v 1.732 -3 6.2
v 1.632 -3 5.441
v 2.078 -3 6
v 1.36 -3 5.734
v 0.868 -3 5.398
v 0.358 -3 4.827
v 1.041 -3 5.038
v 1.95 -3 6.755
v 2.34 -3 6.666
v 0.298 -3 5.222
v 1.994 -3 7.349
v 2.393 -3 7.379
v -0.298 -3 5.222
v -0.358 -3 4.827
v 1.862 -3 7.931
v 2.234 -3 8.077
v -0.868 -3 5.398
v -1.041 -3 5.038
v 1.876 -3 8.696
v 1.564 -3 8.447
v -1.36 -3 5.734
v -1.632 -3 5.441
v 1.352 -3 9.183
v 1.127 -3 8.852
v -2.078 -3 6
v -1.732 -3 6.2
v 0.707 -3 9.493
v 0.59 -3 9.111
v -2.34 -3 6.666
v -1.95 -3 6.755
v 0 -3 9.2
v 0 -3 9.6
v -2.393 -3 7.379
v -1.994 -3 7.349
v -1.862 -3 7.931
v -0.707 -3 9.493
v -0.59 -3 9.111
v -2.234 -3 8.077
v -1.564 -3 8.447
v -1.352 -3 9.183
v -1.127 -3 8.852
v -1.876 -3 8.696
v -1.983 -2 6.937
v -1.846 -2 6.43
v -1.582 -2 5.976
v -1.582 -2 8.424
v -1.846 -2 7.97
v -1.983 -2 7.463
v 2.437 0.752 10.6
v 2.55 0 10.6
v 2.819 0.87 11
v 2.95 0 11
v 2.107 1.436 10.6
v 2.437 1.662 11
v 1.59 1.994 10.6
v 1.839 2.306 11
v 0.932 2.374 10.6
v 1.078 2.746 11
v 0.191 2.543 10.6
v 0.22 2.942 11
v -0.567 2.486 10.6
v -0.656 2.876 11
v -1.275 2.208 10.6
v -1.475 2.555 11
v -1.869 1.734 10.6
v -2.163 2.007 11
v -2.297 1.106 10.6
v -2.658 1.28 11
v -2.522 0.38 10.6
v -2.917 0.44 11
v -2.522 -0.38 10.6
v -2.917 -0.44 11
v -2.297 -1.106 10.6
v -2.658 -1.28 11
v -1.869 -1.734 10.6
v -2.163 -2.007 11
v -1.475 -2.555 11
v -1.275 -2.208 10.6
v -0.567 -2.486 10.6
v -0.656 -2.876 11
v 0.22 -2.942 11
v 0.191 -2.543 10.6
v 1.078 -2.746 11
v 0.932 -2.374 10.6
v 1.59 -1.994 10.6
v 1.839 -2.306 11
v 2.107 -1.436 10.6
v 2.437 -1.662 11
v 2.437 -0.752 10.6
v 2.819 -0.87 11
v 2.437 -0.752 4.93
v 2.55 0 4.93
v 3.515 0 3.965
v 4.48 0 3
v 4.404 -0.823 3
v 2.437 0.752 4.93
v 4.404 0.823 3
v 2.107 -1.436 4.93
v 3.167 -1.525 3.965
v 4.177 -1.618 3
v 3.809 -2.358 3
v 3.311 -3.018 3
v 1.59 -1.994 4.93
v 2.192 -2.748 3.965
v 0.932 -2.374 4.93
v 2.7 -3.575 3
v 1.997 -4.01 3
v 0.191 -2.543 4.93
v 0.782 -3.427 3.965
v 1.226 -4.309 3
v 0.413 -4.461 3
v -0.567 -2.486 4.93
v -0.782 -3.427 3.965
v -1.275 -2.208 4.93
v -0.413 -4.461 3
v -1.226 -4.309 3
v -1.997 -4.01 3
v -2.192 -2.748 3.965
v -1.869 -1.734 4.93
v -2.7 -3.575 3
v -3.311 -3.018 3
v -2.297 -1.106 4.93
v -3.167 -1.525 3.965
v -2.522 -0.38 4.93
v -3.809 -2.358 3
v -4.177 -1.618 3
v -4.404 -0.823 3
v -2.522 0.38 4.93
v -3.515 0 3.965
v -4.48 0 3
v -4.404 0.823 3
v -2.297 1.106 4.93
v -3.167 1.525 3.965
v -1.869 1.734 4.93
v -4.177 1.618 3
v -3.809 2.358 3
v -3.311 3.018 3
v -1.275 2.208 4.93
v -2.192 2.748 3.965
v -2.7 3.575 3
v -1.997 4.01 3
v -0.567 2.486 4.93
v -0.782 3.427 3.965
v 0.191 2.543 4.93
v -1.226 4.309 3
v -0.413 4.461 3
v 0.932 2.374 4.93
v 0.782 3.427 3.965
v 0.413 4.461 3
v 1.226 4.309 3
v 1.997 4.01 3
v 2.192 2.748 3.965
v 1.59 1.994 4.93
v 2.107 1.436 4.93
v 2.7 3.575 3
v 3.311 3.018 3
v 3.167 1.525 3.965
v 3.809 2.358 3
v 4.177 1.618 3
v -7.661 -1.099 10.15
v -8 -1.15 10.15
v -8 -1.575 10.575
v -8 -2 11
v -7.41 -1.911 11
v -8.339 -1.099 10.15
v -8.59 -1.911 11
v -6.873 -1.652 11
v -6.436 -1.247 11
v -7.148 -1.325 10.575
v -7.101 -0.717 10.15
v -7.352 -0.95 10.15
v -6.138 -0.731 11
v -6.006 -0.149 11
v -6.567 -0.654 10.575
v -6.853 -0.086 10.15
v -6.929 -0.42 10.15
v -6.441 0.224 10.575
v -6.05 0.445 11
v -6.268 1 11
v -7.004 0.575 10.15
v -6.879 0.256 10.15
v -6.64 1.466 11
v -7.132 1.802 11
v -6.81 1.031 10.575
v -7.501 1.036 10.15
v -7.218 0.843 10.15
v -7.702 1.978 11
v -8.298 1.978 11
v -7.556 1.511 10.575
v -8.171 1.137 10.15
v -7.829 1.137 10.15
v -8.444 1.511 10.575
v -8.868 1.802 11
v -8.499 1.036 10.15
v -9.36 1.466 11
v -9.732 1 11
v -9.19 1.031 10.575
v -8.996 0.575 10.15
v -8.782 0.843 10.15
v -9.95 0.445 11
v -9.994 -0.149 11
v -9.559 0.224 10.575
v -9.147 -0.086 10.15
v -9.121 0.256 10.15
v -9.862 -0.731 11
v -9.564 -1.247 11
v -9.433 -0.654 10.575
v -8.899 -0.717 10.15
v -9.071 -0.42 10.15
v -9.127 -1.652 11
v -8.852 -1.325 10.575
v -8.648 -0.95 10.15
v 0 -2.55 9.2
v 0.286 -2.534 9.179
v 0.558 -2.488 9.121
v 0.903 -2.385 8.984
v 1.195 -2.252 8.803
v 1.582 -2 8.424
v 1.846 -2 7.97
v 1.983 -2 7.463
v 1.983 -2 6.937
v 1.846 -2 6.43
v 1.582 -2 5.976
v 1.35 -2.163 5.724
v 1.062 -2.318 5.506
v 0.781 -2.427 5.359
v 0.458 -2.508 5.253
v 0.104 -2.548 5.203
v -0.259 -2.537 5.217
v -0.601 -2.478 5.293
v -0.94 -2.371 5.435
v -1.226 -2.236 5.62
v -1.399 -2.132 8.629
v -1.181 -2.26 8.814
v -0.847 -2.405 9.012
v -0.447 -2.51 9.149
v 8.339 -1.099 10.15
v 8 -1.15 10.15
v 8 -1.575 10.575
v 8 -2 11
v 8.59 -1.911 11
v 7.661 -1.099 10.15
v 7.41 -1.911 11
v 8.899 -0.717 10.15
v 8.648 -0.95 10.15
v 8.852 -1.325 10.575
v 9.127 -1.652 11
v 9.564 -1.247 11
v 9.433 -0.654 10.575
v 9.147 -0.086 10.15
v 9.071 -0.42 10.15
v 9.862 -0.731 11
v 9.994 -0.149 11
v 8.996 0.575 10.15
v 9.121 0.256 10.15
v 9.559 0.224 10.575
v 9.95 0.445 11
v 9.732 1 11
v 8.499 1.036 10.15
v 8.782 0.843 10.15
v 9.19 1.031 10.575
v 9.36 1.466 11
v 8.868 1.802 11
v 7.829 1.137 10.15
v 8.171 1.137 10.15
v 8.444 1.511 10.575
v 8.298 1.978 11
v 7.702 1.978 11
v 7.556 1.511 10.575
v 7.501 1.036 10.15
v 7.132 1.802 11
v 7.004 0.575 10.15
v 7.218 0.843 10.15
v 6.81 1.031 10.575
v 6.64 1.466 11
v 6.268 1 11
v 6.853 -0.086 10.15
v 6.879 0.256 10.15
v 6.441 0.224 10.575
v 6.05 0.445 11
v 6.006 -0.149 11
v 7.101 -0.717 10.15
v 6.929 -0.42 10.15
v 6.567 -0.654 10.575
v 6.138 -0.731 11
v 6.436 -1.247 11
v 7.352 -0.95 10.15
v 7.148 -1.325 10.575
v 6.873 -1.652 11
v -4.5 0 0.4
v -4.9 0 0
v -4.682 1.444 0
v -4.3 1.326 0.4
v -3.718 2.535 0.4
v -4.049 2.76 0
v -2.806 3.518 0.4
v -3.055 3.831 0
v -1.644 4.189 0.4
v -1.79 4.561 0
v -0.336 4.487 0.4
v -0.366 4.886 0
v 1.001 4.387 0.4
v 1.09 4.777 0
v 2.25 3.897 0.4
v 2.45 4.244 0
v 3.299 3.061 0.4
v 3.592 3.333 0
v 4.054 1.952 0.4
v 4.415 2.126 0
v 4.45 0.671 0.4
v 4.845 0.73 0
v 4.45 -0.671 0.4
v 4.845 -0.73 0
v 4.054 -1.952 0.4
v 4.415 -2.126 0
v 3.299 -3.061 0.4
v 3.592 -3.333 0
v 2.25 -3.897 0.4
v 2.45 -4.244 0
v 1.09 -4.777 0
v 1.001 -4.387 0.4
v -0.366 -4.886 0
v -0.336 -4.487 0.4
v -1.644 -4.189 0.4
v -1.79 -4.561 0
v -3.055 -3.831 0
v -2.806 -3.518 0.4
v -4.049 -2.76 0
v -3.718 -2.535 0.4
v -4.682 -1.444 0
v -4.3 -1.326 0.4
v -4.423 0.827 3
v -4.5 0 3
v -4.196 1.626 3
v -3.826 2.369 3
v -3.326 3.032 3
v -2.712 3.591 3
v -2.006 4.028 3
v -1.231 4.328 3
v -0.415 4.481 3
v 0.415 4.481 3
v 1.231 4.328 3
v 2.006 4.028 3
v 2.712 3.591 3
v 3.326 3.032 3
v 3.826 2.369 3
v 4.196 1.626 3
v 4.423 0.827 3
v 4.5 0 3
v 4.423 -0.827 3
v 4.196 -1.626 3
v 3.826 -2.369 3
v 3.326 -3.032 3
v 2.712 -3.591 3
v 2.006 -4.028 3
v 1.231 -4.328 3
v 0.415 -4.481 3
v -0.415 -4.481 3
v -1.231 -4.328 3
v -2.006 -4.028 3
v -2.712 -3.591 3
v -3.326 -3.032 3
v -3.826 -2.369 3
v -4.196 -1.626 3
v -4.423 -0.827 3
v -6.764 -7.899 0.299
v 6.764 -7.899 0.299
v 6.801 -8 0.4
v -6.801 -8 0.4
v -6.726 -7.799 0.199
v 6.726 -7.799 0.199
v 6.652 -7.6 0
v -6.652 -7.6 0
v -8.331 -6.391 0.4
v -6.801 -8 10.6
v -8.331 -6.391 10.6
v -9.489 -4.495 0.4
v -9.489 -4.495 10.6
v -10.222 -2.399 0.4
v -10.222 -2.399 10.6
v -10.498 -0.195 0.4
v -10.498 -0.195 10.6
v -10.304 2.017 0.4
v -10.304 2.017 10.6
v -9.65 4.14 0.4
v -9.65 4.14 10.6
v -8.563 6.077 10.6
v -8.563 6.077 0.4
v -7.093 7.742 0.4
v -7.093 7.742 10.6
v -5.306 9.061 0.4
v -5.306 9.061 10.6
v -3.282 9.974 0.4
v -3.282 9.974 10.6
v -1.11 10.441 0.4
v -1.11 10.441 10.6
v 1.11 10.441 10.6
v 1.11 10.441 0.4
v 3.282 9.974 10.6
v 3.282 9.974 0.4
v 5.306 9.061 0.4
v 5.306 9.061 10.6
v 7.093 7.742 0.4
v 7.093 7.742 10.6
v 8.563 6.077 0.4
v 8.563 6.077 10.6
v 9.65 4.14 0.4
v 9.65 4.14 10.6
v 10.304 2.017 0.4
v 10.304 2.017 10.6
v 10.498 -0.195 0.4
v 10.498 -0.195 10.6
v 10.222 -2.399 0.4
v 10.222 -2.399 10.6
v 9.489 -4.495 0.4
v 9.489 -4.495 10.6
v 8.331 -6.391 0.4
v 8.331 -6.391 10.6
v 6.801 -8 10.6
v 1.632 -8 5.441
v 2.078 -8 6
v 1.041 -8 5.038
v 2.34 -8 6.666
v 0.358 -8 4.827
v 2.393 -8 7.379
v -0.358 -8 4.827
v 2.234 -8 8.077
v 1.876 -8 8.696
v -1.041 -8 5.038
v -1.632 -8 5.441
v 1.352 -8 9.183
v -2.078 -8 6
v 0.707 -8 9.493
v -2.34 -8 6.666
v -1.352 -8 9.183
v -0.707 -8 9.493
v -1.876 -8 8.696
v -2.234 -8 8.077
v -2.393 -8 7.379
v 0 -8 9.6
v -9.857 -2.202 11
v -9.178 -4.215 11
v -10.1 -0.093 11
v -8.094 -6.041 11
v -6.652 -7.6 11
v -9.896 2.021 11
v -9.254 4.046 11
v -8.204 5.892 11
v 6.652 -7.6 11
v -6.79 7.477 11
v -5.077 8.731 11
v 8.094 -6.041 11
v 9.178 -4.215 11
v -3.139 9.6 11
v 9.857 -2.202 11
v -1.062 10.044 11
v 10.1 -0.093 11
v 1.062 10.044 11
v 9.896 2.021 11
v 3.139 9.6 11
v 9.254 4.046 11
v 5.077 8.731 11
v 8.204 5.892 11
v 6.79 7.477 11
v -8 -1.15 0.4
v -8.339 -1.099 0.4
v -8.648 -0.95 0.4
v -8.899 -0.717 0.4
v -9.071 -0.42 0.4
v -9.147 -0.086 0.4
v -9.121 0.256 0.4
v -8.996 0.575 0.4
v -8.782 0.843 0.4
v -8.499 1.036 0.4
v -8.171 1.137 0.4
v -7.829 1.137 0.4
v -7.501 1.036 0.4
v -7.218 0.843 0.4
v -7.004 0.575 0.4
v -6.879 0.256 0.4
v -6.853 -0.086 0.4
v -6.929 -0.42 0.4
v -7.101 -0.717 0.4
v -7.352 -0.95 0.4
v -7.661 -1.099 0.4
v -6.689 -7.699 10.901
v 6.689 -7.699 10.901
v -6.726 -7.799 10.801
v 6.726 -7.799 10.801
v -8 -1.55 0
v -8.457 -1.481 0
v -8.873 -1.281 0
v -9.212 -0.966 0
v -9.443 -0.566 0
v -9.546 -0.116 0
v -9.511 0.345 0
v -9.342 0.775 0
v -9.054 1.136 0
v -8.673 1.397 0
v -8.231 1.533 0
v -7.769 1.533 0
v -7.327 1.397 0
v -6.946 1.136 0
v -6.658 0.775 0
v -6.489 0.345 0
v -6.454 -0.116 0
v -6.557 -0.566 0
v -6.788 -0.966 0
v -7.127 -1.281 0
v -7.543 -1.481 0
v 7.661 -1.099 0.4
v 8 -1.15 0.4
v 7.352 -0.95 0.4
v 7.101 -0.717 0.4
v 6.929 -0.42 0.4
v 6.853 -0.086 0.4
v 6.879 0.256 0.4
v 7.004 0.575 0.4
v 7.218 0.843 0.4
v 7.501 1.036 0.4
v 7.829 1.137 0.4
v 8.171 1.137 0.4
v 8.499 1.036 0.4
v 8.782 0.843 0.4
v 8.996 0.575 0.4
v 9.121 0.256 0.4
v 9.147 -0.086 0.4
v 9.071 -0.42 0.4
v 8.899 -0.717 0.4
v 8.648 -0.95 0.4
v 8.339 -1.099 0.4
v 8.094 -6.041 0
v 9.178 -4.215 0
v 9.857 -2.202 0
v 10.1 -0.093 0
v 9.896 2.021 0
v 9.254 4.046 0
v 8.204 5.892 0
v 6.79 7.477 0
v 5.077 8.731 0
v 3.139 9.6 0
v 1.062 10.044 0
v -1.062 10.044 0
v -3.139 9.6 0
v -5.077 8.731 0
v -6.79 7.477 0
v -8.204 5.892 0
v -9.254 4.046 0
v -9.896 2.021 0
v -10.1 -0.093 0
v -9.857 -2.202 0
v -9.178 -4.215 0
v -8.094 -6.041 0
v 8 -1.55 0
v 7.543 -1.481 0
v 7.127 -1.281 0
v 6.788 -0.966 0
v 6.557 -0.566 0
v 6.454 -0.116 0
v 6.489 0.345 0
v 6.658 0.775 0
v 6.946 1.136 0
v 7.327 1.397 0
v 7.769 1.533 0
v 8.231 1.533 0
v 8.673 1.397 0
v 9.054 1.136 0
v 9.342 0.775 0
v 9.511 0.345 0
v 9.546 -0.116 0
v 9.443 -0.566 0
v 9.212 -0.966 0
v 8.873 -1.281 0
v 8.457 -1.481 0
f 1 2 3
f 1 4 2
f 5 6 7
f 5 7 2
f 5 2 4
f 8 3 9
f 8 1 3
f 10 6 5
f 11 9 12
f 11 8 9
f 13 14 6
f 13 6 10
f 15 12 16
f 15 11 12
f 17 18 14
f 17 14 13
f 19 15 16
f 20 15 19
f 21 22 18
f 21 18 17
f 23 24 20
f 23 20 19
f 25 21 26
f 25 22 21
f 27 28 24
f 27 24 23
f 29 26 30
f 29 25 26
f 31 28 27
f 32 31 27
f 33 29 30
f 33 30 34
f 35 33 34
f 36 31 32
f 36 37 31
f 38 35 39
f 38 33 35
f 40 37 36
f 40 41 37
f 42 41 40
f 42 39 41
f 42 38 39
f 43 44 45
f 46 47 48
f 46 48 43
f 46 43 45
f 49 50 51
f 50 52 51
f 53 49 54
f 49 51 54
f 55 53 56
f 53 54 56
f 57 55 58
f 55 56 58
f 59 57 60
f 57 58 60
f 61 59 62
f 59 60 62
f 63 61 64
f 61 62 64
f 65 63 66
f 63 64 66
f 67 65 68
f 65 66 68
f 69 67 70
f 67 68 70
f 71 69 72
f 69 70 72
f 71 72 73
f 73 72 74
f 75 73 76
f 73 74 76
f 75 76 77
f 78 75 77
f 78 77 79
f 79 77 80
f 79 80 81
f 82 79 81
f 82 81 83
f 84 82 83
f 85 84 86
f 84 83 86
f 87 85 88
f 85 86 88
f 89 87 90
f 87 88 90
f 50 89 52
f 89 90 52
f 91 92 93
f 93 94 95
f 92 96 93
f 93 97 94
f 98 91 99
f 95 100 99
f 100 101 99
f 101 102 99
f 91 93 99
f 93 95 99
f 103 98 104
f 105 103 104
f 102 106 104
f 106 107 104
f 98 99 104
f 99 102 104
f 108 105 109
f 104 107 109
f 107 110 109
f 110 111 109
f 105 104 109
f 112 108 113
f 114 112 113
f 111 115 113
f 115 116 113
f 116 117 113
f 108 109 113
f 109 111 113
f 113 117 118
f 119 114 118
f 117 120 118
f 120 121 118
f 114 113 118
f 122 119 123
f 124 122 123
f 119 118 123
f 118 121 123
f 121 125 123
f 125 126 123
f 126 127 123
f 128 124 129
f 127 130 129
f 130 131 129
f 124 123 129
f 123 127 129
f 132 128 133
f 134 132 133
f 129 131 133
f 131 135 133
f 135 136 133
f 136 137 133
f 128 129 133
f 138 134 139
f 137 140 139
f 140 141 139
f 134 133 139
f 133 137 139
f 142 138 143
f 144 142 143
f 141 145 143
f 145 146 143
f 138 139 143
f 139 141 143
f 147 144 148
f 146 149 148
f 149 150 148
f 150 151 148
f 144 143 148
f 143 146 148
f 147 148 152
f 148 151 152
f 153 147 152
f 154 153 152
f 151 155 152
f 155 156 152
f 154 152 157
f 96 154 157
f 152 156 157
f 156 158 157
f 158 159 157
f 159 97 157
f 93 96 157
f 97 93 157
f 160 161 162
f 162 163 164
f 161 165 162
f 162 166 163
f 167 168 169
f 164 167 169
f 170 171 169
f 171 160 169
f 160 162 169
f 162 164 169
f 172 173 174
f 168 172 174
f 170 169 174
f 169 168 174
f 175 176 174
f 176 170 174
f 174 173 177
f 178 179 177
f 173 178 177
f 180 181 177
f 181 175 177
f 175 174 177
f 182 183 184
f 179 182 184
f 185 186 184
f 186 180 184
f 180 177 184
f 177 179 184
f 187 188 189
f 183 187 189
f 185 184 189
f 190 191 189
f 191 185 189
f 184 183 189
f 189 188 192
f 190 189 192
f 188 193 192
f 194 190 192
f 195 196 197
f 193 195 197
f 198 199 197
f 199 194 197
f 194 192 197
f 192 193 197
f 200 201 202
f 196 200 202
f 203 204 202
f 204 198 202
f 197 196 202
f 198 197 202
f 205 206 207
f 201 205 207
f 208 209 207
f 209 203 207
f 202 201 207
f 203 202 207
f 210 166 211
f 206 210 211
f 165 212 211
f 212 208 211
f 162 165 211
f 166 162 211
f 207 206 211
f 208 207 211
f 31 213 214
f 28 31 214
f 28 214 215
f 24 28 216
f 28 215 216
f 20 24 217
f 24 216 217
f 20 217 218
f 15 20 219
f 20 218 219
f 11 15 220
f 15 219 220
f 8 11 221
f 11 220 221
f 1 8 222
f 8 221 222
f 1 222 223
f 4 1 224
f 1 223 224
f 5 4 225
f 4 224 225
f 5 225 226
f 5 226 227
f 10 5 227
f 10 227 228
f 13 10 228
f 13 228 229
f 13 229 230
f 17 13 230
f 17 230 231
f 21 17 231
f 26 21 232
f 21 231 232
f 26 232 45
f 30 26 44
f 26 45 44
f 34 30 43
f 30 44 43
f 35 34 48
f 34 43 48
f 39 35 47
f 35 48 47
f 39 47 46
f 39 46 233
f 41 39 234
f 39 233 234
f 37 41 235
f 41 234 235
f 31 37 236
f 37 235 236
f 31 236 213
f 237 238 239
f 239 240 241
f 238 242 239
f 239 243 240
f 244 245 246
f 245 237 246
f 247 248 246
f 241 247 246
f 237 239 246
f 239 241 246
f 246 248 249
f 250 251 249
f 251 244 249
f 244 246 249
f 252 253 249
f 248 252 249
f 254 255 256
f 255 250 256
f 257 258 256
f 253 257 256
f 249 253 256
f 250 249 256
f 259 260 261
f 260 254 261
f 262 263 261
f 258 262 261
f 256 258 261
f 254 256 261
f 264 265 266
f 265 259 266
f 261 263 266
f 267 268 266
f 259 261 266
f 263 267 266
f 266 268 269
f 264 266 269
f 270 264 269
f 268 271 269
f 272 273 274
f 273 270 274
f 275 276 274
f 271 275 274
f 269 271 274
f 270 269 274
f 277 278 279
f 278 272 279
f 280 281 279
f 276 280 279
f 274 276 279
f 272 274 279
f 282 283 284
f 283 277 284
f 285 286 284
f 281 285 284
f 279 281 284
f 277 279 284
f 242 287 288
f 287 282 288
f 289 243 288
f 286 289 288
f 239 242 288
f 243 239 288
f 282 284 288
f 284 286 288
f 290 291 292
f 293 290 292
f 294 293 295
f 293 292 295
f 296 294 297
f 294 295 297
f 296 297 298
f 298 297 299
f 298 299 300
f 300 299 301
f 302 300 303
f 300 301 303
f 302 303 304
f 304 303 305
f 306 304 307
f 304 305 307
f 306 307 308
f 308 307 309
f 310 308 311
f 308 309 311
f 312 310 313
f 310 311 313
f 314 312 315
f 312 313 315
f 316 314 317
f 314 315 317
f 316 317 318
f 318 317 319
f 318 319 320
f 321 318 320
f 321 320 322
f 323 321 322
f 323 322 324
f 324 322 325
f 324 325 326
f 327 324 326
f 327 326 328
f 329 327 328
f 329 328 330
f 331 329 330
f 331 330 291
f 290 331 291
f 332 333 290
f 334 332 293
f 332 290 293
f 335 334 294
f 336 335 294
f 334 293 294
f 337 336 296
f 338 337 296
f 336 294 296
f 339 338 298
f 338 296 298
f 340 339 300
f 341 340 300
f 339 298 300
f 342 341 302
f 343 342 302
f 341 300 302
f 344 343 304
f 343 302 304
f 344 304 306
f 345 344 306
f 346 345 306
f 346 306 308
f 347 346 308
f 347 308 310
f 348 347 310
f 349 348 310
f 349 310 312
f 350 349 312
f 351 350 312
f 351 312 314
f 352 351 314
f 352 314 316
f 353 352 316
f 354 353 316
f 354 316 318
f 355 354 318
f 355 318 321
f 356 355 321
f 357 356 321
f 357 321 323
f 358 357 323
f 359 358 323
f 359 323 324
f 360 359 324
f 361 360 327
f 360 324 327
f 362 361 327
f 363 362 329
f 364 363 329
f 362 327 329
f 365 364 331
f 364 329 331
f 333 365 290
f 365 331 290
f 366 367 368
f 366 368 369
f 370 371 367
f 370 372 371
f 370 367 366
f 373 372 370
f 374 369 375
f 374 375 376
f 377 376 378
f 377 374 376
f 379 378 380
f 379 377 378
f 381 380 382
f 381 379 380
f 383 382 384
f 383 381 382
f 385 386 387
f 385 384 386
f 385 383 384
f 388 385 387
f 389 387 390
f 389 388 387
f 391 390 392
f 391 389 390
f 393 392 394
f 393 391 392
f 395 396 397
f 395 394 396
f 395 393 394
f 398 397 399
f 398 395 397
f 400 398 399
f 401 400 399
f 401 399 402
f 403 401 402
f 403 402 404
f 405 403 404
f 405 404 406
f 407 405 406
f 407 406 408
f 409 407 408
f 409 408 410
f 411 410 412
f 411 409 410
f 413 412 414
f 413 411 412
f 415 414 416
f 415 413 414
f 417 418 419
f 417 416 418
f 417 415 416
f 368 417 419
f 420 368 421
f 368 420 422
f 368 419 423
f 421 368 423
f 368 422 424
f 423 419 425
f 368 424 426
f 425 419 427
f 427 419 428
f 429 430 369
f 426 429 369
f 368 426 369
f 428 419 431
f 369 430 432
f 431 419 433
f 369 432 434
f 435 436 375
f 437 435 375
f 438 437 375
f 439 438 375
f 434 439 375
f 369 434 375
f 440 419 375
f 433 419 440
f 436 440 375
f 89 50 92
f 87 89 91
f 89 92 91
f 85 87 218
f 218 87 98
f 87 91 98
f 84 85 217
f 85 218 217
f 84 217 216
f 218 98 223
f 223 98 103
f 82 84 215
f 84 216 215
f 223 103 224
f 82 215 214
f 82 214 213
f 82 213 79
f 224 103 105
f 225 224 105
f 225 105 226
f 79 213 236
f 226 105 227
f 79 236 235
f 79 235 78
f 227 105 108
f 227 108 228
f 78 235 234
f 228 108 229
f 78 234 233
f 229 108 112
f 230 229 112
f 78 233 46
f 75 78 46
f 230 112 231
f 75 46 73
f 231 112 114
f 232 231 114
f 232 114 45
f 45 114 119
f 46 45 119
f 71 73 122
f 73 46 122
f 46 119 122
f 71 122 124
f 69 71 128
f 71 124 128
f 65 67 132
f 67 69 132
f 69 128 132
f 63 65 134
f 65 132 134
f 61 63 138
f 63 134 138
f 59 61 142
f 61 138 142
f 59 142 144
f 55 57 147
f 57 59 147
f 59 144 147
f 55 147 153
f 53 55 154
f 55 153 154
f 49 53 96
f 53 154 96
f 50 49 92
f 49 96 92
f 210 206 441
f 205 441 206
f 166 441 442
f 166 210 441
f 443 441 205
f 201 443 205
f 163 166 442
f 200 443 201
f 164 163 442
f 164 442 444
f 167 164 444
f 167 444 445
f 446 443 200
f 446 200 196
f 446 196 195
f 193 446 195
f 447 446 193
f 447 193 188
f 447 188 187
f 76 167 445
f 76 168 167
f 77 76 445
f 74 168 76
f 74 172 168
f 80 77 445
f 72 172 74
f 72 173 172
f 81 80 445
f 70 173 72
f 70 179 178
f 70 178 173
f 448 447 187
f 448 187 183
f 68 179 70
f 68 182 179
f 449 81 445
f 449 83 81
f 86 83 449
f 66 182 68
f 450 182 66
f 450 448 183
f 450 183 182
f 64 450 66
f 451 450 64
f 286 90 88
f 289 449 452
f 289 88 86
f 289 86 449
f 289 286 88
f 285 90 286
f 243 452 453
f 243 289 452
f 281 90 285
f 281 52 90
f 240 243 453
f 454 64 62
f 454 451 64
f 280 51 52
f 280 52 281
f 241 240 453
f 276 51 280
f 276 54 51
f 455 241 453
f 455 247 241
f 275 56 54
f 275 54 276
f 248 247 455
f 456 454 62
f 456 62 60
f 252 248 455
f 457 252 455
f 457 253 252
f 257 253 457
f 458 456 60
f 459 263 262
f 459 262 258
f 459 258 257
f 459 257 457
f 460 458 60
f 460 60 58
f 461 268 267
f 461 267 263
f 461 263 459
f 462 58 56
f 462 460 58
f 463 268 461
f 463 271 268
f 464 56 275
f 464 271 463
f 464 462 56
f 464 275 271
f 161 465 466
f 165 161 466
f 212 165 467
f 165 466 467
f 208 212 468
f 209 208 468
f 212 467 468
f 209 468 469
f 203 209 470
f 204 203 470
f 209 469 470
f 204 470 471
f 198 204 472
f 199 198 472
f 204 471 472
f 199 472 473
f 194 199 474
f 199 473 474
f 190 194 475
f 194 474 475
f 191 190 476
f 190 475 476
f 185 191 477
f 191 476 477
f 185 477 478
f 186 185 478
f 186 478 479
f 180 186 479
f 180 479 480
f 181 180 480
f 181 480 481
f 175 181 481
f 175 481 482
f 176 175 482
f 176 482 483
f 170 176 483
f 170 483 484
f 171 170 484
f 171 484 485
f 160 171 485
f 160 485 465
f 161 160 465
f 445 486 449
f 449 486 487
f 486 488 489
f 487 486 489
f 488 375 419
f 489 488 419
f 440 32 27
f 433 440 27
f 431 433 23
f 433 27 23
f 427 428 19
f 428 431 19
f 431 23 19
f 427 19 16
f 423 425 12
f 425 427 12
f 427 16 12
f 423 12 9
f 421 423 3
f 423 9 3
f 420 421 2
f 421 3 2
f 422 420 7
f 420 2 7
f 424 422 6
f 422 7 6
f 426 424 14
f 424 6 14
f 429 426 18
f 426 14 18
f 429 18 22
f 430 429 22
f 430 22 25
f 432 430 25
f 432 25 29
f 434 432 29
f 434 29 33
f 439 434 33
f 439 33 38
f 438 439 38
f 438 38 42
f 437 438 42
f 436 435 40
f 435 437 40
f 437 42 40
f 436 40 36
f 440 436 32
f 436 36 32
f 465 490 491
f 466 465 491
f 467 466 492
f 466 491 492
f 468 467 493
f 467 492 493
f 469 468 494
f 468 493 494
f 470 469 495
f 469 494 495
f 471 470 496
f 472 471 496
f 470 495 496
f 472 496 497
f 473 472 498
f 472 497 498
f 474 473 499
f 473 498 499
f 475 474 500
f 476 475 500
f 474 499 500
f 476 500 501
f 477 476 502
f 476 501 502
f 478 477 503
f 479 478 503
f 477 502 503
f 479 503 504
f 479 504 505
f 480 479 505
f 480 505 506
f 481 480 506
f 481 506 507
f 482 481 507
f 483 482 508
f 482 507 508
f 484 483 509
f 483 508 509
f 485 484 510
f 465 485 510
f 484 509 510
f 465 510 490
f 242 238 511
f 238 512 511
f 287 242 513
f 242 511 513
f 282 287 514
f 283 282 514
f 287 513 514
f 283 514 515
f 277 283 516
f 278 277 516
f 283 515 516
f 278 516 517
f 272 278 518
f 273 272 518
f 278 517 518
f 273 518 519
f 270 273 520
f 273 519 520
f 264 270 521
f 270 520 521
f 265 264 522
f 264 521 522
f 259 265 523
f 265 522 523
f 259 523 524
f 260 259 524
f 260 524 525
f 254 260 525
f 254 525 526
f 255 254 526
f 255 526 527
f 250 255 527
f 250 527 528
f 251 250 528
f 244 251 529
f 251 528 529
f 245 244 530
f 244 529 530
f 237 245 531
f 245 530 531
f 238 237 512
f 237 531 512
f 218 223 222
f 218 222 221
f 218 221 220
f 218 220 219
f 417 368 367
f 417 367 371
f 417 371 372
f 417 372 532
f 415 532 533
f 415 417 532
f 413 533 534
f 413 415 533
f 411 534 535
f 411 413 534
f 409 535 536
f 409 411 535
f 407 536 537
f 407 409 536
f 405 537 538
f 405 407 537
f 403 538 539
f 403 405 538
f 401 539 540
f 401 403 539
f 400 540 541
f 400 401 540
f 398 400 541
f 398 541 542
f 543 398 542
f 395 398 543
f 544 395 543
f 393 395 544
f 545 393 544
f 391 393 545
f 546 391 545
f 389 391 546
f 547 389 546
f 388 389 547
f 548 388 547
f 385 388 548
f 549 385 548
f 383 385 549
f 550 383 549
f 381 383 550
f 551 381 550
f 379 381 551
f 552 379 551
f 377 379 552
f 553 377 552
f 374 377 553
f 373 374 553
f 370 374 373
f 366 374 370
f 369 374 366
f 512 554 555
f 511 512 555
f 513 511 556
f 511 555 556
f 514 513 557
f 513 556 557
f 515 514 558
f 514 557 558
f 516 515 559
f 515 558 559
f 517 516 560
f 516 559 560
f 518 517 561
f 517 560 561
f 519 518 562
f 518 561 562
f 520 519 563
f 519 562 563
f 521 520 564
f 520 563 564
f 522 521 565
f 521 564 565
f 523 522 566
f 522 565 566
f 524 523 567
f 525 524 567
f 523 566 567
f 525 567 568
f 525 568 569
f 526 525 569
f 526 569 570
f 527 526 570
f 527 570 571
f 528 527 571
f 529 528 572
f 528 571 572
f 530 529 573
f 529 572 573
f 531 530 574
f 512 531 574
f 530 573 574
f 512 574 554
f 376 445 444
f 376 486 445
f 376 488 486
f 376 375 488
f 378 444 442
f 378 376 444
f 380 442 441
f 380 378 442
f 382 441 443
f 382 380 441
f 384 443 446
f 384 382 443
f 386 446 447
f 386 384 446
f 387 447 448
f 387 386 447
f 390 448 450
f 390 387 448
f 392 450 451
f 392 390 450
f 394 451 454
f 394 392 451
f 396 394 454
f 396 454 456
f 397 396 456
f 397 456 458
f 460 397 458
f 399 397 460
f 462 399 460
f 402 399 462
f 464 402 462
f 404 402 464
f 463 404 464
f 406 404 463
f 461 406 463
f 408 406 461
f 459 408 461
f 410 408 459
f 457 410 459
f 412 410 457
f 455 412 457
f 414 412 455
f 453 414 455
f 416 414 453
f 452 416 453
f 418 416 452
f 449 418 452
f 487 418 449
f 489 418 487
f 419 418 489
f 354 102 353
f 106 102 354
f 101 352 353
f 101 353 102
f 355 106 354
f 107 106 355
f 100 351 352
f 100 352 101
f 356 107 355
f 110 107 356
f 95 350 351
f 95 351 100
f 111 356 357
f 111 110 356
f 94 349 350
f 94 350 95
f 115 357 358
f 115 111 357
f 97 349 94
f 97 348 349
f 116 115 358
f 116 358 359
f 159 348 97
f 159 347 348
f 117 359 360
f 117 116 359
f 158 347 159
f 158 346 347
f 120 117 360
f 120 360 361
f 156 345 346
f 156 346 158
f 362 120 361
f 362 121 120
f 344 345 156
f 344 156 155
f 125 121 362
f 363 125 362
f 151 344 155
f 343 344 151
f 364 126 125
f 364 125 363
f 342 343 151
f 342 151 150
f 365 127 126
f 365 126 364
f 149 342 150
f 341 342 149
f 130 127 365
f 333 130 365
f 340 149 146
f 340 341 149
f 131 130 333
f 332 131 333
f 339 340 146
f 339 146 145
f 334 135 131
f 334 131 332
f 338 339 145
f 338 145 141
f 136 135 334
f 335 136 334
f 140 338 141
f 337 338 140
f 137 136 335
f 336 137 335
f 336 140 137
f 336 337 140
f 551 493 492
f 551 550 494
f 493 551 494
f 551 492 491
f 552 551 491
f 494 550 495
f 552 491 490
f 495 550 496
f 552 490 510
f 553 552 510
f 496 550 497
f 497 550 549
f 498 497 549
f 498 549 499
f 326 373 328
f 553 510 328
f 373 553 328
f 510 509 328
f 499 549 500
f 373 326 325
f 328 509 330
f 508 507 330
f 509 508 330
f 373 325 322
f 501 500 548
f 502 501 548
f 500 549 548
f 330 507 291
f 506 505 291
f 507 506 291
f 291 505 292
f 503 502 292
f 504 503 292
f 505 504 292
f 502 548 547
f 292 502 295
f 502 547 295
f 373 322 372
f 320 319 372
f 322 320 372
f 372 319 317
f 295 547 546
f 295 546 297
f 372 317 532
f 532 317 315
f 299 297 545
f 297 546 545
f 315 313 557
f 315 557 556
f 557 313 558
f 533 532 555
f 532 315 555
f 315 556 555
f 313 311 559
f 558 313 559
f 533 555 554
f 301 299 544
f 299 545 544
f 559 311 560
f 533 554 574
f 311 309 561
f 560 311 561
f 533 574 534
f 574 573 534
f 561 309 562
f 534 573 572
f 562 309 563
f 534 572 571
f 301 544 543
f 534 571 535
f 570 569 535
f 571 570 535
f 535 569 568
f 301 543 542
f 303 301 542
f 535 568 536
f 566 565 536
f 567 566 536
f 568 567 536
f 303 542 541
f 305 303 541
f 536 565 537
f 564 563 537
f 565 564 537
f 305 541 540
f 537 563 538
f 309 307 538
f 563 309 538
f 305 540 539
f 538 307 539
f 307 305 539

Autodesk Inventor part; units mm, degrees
ref_plane "YZ Plane" through (0, 0, 0) normal (1, 0, 0) x (0, 1, 0)
ref_plane "XZ Plane" through (0, 0, 0) normal (0, 1, 0) x (-1, 0, 0)
ref_plane "XY Plane" through (0, 0, 0) normal (0, 0, 1) x (1, 0, 0)
sketch "Sketch1" plane through (0, 0, 0) normal (0, 0, 1) x (1, 0, 0)
  circle A0 centre (0, 0) radius 2.55
  circle A1 centre (0, 0) radius 10.5
  dimension "d0" = 21
  dimension "d1" = 5.1
extrude "Extrusion1" add sketch "Sketch1" along normal blind 11
sketch "Sketch3" plane through (0, 0, 0) normal (0, 0, -1) x (-1, 0, 0)
  circle A0 centre (0, 0) radius 4.5
  dimension "d12" = 9
extrude "Extrusion2" cut sketch "Sketch3" against normal blind 3
chamfer "Chamfer1" distance 1.93 angle 45 1 edges at (-2.55, 0, 3)
sketch "Sketch4" plane through (0, 0, 11) normal (0, 0, 1) x (1, 0, 0)
  line L0 (10, -8) -> (-10, -8)
  line L1 (-10, -8) -> (-10, -18)
  line L2 (-10, -18) -> (10, -18)
  line L3 (10, -18) -> (10, -8)
  point P0 (0, 0)
  point P1 (0, -8)
  dimension "d18" = 20
  dimension "d19" = 8
  dimension "d20" = 10
extrude "Extrusion3" cut sketch "Sketch4" against normal through all
sketch "Sketch2" plane through (0, 0, 11) normal (0, 0, 1) x (1, 0, 0)
  circle A0 centre (0, 0) radius 8 construction
  point P0 (-8, 0)
  point P1 (8, 0)
  dimension "d4" = 16
hole "Hole1" at (-8, 0, 11) at (8, 0, 11) direction (0, 0, -1) diameter 2.3 end through all countersink diameter 4 countersink angle 90
sketch "Sketch5" plane through (0, 0, 0) normal (1, 0, 0) x (0, 1, 0)
  line L0 (-1, 7.2) -> (-12.4416, 7.2)
  line L1 (-8, 11) -> (-8, 0) projected
  line L2 (-8, 9.6) -> (-3, 9.6)
  line L3 (-3, 9.6) -> (-3, 9.2)
  line L4 (-3, 9.2) -> (-2, 9.2)
  line L5 (-2.55, 11) -> (-2.55, 4.93) projected
  line L6 (-2, 9.2) -> (-2, 7.2)
  line L7 (-8, 9.6) -> (-8, 7.2)
  line L8 (10.5, 11) -> (-8, 11) projected
  point P0 (0, 0)
  dimension "d23" = 4.8
  dimension "d24" = 4
  dimension "d25" = 5
  dimension "d27" = 1.4
  dimension "d28" = 1
revolve "Revolution1" cut sketch "Sketch5" angle 360 about axis through (0, -1, 7.2) along (0, -1, 0) contours L0 L5 L4 L6 | L0 L1 L2 L3 L4 L5
chamfer "Chamfer2" distance 0.4 angle 45 8 edges at (0, 10.5, 11) (0, -8, 11) (0, 10.5, 0) (0, -8, 0) (4.5, 0, 0) (-8, 1.15, 0) (8, 1.15, 0) (-2.55, 0, 11)
properties part number "shaft-coupler-pla" material "ABS Plastic"
